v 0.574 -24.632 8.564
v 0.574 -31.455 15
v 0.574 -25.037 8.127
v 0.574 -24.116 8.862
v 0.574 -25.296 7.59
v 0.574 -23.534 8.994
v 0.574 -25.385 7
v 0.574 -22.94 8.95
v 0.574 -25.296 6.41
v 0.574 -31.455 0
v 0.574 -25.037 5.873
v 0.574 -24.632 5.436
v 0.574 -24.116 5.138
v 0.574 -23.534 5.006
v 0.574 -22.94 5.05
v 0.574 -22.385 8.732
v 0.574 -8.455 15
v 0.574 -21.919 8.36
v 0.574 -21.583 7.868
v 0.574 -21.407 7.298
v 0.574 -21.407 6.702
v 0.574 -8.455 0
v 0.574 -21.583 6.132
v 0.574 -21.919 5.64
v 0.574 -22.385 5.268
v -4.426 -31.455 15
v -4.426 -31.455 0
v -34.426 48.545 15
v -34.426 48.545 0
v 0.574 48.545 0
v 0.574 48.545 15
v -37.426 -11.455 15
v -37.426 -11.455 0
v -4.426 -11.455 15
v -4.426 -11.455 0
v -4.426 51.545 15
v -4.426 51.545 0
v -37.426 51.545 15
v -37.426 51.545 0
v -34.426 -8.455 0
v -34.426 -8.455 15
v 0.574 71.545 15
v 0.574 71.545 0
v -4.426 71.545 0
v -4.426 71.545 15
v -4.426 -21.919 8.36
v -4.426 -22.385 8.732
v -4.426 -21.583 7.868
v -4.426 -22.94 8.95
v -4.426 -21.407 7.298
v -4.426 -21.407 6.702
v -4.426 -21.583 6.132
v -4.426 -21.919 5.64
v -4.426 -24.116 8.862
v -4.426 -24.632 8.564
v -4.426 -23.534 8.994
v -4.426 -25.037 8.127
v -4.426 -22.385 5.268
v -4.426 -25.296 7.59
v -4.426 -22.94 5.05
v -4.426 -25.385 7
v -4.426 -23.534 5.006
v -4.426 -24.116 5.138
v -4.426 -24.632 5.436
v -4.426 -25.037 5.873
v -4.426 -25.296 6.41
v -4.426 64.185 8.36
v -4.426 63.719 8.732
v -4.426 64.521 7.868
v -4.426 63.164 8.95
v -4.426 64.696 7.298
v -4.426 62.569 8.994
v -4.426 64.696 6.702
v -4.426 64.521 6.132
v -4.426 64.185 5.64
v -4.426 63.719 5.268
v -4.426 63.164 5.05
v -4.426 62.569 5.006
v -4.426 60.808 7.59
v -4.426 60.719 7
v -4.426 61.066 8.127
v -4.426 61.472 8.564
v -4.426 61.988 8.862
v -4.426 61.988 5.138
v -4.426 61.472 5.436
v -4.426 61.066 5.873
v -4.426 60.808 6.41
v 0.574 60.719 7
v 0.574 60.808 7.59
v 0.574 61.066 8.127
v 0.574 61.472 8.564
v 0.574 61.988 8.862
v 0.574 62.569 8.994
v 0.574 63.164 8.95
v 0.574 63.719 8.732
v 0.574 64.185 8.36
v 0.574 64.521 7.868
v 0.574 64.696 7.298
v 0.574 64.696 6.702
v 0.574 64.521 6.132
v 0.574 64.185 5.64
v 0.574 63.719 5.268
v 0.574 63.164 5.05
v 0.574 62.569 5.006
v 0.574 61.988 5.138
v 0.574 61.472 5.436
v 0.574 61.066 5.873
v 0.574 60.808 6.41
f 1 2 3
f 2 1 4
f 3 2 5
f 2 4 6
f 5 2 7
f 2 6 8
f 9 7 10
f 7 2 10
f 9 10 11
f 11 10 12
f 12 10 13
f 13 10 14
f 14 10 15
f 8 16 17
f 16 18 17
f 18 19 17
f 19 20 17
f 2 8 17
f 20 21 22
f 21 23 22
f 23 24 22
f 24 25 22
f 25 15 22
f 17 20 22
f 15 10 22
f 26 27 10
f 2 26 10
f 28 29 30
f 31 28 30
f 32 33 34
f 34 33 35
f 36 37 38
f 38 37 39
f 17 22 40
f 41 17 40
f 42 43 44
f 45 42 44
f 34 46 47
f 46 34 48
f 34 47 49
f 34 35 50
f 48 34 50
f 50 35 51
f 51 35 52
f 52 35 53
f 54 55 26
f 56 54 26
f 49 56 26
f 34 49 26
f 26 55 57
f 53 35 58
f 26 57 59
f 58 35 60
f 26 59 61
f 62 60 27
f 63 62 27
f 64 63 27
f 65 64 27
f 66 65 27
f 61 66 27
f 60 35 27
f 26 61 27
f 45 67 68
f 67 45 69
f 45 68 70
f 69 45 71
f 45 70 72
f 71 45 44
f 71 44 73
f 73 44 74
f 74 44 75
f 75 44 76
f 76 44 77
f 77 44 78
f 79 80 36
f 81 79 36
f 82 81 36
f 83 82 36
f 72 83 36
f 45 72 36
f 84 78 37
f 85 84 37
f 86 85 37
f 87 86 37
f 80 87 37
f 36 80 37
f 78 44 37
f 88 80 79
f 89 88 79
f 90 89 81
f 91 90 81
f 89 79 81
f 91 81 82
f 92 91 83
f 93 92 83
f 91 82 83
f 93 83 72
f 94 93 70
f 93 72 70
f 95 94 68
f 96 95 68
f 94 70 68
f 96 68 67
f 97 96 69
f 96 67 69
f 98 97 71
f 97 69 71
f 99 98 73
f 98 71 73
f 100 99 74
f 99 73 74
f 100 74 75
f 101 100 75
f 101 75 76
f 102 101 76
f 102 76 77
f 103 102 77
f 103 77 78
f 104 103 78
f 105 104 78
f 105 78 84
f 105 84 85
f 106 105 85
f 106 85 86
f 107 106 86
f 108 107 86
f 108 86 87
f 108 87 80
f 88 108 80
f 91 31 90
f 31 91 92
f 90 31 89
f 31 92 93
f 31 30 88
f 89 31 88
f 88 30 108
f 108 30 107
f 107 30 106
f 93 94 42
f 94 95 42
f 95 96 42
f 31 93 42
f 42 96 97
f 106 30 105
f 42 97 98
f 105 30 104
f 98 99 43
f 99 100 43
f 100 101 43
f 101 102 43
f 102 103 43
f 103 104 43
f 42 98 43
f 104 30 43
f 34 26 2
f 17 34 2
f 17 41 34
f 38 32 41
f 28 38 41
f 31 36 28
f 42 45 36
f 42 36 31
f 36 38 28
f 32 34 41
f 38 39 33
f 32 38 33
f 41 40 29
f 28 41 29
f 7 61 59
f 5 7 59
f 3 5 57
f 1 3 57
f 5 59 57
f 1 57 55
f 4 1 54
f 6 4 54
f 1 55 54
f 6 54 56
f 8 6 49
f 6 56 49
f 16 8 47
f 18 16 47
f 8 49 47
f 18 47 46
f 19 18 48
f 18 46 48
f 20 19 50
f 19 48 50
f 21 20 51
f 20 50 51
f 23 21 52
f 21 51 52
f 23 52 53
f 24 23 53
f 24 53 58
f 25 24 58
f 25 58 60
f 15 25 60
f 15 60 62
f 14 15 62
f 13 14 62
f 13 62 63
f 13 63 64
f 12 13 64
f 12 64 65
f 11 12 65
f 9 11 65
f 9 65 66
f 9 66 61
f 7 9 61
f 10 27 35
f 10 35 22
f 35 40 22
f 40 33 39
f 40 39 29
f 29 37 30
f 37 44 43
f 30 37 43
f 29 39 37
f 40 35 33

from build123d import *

# Parameters (mm, degrees)
PAD_DEPTH   = 15
SKETCH001_R = 2
HOLE_DEPTH  = 25


with BuildPart() as part:
    # Sketch → Pad (new body)
    with BuildSketch(Plane.XY):
        Polygon((-4.425698, 71.54545), (-4.425698, 51.54545), (-37.425698, 51.54545), (-37.425698, -11.45455), (-4.425698, -11.45455), (-4.425698, -31.45455), (0.574302, -31.45455), (0.574302, -8.45455), (-34.425698, -8.45455), (-34.425698, 48.54545), (0.574302, 48.54545), (0.574302, 71.54545), align=None)
    extrude(amount=PAD_DEPTH)

    # Sketch001 (on Face5 of Pad) → Hole (cut)
    with BuildSketch(Plane(origin=(-4.425698, 0, 0), x_dir=(0, -1, 0), z_dir=(-1, 0, 0))):
        with Locations((-62.718771, 7)):
            Circle(SKETCH001_R)
        with Locations((23.384939, 7)):
            Circle(SKETCH001_R)
    extrude(amount=-HOLE_DEPTH, mode=Mode.SUBTRACT)


solid = part.part
